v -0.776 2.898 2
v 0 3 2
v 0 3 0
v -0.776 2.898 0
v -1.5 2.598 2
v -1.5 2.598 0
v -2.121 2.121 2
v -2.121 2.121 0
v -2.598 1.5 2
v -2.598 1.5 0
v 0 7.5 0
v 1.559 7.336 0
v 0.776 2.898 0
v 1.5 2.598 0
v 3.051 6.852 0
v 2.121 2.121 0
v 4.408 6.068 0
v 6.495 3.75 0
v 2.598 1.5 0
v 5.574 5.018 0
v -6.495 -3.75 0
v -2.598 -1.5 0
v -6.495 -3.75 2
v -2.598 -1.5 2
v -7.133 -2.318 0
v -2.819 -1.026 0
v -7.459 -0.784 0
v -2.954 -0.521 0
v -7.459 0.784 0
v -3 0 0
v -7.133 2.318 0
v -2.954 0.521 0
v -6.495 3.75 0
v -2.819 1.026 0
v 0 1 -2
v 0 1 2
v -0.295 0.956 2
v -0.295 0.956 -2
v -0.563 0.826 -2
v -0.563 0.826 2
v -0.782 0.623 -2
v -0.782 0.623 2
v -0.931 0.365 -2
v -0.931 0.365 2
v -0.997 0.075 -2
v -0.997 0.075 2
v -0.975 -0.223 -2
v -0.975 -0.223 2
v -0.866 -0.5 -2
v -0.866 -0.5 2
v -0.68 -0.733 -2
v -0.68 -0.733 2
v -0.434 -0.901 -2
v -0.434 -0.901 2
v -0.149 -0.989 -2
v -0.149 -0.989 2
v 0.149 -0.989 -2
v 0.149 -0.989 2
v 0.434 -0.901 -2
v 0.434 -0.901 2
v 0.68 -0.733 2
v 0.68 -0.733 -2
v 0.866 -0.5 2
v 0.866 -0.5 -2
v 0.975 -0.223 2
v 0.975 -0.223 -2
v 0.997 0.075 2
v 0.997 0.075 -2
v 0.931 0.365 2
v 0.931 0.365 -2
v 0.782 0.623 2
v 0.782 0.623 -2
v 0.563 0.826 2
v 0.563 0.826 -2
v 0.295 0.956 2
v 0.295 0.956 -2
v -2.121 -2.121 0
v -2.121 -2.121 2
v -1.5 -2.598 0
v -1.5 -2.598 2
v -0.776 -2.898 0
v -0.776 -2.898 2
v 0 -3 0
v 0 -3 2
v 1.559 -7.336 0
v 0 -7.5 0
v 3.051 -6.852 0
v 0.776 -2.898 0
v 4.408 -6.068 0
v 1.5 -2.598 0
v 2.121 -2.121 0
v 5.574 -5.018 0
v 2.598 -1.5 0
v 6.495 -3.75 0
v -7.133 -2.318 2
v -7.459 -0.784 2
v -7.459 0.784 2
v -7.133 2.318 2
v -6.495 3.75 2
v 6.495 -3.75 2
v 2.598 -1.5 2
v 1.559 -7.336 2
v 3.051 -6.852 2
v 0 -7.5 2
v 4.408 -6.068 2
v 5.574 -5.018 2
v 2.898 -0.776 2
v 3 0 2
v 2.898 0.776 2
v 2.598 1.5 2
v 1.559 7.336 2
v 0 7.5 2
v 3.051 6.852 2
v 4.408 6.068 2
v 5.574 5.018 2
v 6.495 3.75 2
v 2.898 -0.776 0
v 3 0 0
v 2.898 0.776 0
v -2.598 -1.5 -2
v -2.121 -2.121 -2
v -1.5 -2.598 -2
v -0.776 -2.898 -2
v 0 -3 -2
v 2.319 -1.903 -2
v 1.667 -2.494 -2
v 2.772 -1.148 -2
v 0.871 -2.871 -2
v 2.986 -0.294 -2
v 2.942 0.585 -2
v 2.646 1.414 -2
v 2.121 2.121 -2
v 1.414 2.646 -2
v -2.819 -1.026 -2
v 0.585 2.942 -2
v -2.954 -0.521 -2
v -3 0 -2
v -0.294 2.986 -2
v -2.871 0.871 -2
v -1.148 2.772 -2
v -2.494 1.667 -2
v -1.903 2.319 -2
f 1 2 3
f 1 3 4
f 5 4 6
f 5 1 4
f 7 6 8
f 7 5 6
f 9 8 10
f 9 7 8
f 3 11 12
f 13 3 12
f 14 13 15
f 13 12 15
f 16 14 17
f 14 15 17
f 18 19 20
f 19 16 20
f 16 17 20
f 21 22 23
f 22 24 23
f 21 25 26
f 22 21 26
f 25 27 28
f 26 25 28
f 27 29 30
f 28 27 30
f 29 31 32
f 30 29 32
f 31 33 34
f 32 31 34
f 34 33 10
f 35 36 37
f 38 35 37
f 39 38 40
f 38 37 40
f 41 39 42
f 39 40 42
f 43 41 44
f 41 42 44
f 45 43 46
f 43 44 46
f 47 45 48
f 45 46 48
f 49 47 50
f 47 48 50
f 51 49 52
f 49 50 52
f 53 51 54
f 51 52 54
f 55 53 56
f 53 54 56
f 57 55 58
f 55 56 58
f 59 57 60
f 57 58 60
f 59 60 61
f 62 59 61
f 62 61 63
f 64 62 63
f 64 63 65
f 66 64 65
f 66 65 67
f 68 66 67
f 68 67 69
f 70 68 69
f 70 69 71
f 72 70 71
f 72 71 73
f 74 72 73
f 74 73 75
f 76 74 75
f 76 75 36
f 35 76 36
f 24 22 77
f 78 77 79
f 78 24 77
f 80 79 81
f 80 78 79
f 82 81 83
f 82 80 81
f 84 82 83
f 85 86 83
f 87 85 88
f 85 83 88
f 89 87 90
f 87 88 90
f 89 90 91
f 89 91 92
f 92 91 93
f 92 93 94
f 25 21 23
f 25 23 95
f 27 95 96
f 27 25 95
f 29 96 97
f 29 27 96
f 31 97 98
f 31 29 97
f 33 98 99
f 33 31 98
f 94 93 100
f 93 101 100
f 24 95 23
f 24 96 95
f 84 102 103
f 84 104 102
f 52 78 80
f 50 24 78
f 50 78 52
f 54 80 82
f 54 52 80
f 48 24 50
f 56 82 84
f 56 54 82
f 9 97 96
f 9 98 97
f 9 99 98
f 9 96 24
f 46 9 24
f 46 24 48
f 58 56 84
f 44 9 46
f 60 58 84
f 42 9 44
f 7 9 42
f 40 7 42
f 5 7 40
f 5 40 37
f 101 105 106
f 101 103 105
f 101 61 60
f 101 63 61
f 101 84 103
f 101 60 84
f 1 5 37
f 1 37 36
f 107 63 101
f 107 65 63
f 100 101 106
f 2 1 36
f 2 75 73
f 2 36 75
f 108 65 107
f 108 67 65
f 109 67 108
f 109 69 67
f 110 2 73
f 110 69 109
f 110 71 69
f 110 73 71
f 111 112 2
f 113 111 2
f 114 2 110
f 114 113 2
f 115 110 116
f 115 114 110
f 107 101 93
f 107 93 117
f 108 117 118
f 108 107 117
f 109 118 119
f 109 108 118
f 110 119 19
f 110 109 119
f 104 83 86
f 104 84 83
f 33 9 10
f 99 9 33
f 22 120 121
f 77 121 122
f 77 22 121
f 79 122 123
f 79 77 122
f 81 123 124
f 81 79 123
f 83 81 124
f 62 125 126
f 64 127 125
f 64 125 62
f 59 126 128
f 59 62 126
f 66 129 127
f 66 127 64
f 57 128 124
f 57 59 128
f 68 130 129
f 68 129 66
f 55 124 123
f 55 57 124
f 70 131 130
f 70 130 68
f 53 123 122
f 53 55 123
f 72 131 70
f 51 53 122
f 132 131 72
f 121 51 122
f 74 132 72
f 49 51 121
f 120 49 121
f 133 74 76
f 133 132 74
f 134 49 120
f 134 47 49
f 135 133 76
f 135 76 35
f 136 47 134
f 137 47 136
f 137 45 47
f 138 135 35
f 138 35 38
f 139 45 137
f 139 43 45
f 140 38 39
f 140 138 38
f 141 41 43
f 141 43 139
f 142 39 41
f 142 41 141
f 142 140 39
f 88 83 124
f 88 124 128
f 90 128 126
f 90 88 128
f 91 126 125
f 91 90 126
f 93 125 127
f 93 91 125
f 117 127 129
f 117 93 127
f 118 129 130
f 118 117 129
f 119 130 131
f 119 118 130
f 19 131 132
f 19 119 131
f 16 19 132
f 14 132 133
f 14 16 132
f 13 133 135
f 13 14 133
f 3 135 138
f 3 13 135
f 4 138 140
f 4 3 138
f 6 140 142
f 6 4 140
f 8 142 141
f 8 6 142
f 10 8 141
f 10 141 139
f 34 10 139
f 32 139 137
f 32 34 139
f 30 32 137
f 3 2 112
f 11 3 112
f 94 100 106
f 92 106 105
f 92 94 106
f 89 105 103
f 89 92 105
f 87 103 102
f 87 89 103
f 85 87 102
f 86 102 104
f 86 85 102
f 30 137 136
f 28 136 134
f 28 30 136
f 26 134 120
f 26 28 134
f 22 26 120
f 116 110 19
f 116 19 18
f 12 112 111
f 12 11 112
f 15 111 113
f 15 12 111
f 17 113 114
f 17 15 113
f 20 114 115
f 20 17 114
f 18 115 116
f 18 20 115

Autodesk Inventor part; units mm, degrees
ref_plane "YZ Plane" through (0, 0, 0) normal (1, 0, 0) x (0, 1, 0)
ref_plane "XZ Plane" through (0, 0, 0) normal (0, 1, 0) x (-1, 0, 0)
ref_plane "XY Plane" through (0, 0, 0) normal (0, 0, 1) x (1, 0, 0)
sketch "スケッチ1" plane through (0, 0, 0) normal (0, 0, 1) x (1, 0, 0)
  circle A0 centre (0, 0) radius 7.5
  dimension "DIA" = 15
extrude "押し出し1" add sketch "スケッチ1" along normal blind 2
sketch "スケッチ2" plane through (0, 0, 2) normal (0, 0, 1) x (1, 0, 0)
  line L0 (0, 0) -> (0, 15)
  line L1 (0, 0) -> (-12.9904, 7.5)
  line L2 (0, 0) -> (15, 0) construction
  line L3 (-12.9904, 7.5) -> (0, 15)
  circle A0 centre (0, 0) radius 3
  point P0 (-2.5981, 1.5)
  point P1 (0, 3)
  dimension "d3" = 15
  dimension "d4" = 15
  dimension "d5" = 150
  dimension "HUB_DIA" = 6
extrude "押し出し2" cut sketch "スケッチ2" against normal blind 2 contours A0 L1 L3 L0
pattern_circular "円形状パターン1" count 3 over 360 about axis through (0, 0, -10) along (0, 0, 1) of "押し出し2"
sketch "スケッチ3" plane through (0, 0, 0) normal (0, 0, -1) x (-1, 0, 0)
  circle A0 centre (0, 0) radius 3
  arc A1 (0, -3) -> (2.5981, -1.5) centre (0, 0) ccw projected
extrude "押し出し3" add sketch "スケッチ3" along normal blind 2
sketch "スケッチ4" plane through (0, 0, -2) normal (0, 0, -1) x (-1, 0, 0)
  point P0 (0, 0)
  point P1 (0, 0)
hole "穴1" at (0, 0, -2) direction (0, 0, 1) diameter 2 end through all
equation "\"d3\" = DIA"
equation "\"d4\" = DIA"
equation "\"d6\" = THIN"
equation "\"d12\" = THIN"
equation "\"THIN\" = 2"
properties part number "SlitDisc-FA130"
